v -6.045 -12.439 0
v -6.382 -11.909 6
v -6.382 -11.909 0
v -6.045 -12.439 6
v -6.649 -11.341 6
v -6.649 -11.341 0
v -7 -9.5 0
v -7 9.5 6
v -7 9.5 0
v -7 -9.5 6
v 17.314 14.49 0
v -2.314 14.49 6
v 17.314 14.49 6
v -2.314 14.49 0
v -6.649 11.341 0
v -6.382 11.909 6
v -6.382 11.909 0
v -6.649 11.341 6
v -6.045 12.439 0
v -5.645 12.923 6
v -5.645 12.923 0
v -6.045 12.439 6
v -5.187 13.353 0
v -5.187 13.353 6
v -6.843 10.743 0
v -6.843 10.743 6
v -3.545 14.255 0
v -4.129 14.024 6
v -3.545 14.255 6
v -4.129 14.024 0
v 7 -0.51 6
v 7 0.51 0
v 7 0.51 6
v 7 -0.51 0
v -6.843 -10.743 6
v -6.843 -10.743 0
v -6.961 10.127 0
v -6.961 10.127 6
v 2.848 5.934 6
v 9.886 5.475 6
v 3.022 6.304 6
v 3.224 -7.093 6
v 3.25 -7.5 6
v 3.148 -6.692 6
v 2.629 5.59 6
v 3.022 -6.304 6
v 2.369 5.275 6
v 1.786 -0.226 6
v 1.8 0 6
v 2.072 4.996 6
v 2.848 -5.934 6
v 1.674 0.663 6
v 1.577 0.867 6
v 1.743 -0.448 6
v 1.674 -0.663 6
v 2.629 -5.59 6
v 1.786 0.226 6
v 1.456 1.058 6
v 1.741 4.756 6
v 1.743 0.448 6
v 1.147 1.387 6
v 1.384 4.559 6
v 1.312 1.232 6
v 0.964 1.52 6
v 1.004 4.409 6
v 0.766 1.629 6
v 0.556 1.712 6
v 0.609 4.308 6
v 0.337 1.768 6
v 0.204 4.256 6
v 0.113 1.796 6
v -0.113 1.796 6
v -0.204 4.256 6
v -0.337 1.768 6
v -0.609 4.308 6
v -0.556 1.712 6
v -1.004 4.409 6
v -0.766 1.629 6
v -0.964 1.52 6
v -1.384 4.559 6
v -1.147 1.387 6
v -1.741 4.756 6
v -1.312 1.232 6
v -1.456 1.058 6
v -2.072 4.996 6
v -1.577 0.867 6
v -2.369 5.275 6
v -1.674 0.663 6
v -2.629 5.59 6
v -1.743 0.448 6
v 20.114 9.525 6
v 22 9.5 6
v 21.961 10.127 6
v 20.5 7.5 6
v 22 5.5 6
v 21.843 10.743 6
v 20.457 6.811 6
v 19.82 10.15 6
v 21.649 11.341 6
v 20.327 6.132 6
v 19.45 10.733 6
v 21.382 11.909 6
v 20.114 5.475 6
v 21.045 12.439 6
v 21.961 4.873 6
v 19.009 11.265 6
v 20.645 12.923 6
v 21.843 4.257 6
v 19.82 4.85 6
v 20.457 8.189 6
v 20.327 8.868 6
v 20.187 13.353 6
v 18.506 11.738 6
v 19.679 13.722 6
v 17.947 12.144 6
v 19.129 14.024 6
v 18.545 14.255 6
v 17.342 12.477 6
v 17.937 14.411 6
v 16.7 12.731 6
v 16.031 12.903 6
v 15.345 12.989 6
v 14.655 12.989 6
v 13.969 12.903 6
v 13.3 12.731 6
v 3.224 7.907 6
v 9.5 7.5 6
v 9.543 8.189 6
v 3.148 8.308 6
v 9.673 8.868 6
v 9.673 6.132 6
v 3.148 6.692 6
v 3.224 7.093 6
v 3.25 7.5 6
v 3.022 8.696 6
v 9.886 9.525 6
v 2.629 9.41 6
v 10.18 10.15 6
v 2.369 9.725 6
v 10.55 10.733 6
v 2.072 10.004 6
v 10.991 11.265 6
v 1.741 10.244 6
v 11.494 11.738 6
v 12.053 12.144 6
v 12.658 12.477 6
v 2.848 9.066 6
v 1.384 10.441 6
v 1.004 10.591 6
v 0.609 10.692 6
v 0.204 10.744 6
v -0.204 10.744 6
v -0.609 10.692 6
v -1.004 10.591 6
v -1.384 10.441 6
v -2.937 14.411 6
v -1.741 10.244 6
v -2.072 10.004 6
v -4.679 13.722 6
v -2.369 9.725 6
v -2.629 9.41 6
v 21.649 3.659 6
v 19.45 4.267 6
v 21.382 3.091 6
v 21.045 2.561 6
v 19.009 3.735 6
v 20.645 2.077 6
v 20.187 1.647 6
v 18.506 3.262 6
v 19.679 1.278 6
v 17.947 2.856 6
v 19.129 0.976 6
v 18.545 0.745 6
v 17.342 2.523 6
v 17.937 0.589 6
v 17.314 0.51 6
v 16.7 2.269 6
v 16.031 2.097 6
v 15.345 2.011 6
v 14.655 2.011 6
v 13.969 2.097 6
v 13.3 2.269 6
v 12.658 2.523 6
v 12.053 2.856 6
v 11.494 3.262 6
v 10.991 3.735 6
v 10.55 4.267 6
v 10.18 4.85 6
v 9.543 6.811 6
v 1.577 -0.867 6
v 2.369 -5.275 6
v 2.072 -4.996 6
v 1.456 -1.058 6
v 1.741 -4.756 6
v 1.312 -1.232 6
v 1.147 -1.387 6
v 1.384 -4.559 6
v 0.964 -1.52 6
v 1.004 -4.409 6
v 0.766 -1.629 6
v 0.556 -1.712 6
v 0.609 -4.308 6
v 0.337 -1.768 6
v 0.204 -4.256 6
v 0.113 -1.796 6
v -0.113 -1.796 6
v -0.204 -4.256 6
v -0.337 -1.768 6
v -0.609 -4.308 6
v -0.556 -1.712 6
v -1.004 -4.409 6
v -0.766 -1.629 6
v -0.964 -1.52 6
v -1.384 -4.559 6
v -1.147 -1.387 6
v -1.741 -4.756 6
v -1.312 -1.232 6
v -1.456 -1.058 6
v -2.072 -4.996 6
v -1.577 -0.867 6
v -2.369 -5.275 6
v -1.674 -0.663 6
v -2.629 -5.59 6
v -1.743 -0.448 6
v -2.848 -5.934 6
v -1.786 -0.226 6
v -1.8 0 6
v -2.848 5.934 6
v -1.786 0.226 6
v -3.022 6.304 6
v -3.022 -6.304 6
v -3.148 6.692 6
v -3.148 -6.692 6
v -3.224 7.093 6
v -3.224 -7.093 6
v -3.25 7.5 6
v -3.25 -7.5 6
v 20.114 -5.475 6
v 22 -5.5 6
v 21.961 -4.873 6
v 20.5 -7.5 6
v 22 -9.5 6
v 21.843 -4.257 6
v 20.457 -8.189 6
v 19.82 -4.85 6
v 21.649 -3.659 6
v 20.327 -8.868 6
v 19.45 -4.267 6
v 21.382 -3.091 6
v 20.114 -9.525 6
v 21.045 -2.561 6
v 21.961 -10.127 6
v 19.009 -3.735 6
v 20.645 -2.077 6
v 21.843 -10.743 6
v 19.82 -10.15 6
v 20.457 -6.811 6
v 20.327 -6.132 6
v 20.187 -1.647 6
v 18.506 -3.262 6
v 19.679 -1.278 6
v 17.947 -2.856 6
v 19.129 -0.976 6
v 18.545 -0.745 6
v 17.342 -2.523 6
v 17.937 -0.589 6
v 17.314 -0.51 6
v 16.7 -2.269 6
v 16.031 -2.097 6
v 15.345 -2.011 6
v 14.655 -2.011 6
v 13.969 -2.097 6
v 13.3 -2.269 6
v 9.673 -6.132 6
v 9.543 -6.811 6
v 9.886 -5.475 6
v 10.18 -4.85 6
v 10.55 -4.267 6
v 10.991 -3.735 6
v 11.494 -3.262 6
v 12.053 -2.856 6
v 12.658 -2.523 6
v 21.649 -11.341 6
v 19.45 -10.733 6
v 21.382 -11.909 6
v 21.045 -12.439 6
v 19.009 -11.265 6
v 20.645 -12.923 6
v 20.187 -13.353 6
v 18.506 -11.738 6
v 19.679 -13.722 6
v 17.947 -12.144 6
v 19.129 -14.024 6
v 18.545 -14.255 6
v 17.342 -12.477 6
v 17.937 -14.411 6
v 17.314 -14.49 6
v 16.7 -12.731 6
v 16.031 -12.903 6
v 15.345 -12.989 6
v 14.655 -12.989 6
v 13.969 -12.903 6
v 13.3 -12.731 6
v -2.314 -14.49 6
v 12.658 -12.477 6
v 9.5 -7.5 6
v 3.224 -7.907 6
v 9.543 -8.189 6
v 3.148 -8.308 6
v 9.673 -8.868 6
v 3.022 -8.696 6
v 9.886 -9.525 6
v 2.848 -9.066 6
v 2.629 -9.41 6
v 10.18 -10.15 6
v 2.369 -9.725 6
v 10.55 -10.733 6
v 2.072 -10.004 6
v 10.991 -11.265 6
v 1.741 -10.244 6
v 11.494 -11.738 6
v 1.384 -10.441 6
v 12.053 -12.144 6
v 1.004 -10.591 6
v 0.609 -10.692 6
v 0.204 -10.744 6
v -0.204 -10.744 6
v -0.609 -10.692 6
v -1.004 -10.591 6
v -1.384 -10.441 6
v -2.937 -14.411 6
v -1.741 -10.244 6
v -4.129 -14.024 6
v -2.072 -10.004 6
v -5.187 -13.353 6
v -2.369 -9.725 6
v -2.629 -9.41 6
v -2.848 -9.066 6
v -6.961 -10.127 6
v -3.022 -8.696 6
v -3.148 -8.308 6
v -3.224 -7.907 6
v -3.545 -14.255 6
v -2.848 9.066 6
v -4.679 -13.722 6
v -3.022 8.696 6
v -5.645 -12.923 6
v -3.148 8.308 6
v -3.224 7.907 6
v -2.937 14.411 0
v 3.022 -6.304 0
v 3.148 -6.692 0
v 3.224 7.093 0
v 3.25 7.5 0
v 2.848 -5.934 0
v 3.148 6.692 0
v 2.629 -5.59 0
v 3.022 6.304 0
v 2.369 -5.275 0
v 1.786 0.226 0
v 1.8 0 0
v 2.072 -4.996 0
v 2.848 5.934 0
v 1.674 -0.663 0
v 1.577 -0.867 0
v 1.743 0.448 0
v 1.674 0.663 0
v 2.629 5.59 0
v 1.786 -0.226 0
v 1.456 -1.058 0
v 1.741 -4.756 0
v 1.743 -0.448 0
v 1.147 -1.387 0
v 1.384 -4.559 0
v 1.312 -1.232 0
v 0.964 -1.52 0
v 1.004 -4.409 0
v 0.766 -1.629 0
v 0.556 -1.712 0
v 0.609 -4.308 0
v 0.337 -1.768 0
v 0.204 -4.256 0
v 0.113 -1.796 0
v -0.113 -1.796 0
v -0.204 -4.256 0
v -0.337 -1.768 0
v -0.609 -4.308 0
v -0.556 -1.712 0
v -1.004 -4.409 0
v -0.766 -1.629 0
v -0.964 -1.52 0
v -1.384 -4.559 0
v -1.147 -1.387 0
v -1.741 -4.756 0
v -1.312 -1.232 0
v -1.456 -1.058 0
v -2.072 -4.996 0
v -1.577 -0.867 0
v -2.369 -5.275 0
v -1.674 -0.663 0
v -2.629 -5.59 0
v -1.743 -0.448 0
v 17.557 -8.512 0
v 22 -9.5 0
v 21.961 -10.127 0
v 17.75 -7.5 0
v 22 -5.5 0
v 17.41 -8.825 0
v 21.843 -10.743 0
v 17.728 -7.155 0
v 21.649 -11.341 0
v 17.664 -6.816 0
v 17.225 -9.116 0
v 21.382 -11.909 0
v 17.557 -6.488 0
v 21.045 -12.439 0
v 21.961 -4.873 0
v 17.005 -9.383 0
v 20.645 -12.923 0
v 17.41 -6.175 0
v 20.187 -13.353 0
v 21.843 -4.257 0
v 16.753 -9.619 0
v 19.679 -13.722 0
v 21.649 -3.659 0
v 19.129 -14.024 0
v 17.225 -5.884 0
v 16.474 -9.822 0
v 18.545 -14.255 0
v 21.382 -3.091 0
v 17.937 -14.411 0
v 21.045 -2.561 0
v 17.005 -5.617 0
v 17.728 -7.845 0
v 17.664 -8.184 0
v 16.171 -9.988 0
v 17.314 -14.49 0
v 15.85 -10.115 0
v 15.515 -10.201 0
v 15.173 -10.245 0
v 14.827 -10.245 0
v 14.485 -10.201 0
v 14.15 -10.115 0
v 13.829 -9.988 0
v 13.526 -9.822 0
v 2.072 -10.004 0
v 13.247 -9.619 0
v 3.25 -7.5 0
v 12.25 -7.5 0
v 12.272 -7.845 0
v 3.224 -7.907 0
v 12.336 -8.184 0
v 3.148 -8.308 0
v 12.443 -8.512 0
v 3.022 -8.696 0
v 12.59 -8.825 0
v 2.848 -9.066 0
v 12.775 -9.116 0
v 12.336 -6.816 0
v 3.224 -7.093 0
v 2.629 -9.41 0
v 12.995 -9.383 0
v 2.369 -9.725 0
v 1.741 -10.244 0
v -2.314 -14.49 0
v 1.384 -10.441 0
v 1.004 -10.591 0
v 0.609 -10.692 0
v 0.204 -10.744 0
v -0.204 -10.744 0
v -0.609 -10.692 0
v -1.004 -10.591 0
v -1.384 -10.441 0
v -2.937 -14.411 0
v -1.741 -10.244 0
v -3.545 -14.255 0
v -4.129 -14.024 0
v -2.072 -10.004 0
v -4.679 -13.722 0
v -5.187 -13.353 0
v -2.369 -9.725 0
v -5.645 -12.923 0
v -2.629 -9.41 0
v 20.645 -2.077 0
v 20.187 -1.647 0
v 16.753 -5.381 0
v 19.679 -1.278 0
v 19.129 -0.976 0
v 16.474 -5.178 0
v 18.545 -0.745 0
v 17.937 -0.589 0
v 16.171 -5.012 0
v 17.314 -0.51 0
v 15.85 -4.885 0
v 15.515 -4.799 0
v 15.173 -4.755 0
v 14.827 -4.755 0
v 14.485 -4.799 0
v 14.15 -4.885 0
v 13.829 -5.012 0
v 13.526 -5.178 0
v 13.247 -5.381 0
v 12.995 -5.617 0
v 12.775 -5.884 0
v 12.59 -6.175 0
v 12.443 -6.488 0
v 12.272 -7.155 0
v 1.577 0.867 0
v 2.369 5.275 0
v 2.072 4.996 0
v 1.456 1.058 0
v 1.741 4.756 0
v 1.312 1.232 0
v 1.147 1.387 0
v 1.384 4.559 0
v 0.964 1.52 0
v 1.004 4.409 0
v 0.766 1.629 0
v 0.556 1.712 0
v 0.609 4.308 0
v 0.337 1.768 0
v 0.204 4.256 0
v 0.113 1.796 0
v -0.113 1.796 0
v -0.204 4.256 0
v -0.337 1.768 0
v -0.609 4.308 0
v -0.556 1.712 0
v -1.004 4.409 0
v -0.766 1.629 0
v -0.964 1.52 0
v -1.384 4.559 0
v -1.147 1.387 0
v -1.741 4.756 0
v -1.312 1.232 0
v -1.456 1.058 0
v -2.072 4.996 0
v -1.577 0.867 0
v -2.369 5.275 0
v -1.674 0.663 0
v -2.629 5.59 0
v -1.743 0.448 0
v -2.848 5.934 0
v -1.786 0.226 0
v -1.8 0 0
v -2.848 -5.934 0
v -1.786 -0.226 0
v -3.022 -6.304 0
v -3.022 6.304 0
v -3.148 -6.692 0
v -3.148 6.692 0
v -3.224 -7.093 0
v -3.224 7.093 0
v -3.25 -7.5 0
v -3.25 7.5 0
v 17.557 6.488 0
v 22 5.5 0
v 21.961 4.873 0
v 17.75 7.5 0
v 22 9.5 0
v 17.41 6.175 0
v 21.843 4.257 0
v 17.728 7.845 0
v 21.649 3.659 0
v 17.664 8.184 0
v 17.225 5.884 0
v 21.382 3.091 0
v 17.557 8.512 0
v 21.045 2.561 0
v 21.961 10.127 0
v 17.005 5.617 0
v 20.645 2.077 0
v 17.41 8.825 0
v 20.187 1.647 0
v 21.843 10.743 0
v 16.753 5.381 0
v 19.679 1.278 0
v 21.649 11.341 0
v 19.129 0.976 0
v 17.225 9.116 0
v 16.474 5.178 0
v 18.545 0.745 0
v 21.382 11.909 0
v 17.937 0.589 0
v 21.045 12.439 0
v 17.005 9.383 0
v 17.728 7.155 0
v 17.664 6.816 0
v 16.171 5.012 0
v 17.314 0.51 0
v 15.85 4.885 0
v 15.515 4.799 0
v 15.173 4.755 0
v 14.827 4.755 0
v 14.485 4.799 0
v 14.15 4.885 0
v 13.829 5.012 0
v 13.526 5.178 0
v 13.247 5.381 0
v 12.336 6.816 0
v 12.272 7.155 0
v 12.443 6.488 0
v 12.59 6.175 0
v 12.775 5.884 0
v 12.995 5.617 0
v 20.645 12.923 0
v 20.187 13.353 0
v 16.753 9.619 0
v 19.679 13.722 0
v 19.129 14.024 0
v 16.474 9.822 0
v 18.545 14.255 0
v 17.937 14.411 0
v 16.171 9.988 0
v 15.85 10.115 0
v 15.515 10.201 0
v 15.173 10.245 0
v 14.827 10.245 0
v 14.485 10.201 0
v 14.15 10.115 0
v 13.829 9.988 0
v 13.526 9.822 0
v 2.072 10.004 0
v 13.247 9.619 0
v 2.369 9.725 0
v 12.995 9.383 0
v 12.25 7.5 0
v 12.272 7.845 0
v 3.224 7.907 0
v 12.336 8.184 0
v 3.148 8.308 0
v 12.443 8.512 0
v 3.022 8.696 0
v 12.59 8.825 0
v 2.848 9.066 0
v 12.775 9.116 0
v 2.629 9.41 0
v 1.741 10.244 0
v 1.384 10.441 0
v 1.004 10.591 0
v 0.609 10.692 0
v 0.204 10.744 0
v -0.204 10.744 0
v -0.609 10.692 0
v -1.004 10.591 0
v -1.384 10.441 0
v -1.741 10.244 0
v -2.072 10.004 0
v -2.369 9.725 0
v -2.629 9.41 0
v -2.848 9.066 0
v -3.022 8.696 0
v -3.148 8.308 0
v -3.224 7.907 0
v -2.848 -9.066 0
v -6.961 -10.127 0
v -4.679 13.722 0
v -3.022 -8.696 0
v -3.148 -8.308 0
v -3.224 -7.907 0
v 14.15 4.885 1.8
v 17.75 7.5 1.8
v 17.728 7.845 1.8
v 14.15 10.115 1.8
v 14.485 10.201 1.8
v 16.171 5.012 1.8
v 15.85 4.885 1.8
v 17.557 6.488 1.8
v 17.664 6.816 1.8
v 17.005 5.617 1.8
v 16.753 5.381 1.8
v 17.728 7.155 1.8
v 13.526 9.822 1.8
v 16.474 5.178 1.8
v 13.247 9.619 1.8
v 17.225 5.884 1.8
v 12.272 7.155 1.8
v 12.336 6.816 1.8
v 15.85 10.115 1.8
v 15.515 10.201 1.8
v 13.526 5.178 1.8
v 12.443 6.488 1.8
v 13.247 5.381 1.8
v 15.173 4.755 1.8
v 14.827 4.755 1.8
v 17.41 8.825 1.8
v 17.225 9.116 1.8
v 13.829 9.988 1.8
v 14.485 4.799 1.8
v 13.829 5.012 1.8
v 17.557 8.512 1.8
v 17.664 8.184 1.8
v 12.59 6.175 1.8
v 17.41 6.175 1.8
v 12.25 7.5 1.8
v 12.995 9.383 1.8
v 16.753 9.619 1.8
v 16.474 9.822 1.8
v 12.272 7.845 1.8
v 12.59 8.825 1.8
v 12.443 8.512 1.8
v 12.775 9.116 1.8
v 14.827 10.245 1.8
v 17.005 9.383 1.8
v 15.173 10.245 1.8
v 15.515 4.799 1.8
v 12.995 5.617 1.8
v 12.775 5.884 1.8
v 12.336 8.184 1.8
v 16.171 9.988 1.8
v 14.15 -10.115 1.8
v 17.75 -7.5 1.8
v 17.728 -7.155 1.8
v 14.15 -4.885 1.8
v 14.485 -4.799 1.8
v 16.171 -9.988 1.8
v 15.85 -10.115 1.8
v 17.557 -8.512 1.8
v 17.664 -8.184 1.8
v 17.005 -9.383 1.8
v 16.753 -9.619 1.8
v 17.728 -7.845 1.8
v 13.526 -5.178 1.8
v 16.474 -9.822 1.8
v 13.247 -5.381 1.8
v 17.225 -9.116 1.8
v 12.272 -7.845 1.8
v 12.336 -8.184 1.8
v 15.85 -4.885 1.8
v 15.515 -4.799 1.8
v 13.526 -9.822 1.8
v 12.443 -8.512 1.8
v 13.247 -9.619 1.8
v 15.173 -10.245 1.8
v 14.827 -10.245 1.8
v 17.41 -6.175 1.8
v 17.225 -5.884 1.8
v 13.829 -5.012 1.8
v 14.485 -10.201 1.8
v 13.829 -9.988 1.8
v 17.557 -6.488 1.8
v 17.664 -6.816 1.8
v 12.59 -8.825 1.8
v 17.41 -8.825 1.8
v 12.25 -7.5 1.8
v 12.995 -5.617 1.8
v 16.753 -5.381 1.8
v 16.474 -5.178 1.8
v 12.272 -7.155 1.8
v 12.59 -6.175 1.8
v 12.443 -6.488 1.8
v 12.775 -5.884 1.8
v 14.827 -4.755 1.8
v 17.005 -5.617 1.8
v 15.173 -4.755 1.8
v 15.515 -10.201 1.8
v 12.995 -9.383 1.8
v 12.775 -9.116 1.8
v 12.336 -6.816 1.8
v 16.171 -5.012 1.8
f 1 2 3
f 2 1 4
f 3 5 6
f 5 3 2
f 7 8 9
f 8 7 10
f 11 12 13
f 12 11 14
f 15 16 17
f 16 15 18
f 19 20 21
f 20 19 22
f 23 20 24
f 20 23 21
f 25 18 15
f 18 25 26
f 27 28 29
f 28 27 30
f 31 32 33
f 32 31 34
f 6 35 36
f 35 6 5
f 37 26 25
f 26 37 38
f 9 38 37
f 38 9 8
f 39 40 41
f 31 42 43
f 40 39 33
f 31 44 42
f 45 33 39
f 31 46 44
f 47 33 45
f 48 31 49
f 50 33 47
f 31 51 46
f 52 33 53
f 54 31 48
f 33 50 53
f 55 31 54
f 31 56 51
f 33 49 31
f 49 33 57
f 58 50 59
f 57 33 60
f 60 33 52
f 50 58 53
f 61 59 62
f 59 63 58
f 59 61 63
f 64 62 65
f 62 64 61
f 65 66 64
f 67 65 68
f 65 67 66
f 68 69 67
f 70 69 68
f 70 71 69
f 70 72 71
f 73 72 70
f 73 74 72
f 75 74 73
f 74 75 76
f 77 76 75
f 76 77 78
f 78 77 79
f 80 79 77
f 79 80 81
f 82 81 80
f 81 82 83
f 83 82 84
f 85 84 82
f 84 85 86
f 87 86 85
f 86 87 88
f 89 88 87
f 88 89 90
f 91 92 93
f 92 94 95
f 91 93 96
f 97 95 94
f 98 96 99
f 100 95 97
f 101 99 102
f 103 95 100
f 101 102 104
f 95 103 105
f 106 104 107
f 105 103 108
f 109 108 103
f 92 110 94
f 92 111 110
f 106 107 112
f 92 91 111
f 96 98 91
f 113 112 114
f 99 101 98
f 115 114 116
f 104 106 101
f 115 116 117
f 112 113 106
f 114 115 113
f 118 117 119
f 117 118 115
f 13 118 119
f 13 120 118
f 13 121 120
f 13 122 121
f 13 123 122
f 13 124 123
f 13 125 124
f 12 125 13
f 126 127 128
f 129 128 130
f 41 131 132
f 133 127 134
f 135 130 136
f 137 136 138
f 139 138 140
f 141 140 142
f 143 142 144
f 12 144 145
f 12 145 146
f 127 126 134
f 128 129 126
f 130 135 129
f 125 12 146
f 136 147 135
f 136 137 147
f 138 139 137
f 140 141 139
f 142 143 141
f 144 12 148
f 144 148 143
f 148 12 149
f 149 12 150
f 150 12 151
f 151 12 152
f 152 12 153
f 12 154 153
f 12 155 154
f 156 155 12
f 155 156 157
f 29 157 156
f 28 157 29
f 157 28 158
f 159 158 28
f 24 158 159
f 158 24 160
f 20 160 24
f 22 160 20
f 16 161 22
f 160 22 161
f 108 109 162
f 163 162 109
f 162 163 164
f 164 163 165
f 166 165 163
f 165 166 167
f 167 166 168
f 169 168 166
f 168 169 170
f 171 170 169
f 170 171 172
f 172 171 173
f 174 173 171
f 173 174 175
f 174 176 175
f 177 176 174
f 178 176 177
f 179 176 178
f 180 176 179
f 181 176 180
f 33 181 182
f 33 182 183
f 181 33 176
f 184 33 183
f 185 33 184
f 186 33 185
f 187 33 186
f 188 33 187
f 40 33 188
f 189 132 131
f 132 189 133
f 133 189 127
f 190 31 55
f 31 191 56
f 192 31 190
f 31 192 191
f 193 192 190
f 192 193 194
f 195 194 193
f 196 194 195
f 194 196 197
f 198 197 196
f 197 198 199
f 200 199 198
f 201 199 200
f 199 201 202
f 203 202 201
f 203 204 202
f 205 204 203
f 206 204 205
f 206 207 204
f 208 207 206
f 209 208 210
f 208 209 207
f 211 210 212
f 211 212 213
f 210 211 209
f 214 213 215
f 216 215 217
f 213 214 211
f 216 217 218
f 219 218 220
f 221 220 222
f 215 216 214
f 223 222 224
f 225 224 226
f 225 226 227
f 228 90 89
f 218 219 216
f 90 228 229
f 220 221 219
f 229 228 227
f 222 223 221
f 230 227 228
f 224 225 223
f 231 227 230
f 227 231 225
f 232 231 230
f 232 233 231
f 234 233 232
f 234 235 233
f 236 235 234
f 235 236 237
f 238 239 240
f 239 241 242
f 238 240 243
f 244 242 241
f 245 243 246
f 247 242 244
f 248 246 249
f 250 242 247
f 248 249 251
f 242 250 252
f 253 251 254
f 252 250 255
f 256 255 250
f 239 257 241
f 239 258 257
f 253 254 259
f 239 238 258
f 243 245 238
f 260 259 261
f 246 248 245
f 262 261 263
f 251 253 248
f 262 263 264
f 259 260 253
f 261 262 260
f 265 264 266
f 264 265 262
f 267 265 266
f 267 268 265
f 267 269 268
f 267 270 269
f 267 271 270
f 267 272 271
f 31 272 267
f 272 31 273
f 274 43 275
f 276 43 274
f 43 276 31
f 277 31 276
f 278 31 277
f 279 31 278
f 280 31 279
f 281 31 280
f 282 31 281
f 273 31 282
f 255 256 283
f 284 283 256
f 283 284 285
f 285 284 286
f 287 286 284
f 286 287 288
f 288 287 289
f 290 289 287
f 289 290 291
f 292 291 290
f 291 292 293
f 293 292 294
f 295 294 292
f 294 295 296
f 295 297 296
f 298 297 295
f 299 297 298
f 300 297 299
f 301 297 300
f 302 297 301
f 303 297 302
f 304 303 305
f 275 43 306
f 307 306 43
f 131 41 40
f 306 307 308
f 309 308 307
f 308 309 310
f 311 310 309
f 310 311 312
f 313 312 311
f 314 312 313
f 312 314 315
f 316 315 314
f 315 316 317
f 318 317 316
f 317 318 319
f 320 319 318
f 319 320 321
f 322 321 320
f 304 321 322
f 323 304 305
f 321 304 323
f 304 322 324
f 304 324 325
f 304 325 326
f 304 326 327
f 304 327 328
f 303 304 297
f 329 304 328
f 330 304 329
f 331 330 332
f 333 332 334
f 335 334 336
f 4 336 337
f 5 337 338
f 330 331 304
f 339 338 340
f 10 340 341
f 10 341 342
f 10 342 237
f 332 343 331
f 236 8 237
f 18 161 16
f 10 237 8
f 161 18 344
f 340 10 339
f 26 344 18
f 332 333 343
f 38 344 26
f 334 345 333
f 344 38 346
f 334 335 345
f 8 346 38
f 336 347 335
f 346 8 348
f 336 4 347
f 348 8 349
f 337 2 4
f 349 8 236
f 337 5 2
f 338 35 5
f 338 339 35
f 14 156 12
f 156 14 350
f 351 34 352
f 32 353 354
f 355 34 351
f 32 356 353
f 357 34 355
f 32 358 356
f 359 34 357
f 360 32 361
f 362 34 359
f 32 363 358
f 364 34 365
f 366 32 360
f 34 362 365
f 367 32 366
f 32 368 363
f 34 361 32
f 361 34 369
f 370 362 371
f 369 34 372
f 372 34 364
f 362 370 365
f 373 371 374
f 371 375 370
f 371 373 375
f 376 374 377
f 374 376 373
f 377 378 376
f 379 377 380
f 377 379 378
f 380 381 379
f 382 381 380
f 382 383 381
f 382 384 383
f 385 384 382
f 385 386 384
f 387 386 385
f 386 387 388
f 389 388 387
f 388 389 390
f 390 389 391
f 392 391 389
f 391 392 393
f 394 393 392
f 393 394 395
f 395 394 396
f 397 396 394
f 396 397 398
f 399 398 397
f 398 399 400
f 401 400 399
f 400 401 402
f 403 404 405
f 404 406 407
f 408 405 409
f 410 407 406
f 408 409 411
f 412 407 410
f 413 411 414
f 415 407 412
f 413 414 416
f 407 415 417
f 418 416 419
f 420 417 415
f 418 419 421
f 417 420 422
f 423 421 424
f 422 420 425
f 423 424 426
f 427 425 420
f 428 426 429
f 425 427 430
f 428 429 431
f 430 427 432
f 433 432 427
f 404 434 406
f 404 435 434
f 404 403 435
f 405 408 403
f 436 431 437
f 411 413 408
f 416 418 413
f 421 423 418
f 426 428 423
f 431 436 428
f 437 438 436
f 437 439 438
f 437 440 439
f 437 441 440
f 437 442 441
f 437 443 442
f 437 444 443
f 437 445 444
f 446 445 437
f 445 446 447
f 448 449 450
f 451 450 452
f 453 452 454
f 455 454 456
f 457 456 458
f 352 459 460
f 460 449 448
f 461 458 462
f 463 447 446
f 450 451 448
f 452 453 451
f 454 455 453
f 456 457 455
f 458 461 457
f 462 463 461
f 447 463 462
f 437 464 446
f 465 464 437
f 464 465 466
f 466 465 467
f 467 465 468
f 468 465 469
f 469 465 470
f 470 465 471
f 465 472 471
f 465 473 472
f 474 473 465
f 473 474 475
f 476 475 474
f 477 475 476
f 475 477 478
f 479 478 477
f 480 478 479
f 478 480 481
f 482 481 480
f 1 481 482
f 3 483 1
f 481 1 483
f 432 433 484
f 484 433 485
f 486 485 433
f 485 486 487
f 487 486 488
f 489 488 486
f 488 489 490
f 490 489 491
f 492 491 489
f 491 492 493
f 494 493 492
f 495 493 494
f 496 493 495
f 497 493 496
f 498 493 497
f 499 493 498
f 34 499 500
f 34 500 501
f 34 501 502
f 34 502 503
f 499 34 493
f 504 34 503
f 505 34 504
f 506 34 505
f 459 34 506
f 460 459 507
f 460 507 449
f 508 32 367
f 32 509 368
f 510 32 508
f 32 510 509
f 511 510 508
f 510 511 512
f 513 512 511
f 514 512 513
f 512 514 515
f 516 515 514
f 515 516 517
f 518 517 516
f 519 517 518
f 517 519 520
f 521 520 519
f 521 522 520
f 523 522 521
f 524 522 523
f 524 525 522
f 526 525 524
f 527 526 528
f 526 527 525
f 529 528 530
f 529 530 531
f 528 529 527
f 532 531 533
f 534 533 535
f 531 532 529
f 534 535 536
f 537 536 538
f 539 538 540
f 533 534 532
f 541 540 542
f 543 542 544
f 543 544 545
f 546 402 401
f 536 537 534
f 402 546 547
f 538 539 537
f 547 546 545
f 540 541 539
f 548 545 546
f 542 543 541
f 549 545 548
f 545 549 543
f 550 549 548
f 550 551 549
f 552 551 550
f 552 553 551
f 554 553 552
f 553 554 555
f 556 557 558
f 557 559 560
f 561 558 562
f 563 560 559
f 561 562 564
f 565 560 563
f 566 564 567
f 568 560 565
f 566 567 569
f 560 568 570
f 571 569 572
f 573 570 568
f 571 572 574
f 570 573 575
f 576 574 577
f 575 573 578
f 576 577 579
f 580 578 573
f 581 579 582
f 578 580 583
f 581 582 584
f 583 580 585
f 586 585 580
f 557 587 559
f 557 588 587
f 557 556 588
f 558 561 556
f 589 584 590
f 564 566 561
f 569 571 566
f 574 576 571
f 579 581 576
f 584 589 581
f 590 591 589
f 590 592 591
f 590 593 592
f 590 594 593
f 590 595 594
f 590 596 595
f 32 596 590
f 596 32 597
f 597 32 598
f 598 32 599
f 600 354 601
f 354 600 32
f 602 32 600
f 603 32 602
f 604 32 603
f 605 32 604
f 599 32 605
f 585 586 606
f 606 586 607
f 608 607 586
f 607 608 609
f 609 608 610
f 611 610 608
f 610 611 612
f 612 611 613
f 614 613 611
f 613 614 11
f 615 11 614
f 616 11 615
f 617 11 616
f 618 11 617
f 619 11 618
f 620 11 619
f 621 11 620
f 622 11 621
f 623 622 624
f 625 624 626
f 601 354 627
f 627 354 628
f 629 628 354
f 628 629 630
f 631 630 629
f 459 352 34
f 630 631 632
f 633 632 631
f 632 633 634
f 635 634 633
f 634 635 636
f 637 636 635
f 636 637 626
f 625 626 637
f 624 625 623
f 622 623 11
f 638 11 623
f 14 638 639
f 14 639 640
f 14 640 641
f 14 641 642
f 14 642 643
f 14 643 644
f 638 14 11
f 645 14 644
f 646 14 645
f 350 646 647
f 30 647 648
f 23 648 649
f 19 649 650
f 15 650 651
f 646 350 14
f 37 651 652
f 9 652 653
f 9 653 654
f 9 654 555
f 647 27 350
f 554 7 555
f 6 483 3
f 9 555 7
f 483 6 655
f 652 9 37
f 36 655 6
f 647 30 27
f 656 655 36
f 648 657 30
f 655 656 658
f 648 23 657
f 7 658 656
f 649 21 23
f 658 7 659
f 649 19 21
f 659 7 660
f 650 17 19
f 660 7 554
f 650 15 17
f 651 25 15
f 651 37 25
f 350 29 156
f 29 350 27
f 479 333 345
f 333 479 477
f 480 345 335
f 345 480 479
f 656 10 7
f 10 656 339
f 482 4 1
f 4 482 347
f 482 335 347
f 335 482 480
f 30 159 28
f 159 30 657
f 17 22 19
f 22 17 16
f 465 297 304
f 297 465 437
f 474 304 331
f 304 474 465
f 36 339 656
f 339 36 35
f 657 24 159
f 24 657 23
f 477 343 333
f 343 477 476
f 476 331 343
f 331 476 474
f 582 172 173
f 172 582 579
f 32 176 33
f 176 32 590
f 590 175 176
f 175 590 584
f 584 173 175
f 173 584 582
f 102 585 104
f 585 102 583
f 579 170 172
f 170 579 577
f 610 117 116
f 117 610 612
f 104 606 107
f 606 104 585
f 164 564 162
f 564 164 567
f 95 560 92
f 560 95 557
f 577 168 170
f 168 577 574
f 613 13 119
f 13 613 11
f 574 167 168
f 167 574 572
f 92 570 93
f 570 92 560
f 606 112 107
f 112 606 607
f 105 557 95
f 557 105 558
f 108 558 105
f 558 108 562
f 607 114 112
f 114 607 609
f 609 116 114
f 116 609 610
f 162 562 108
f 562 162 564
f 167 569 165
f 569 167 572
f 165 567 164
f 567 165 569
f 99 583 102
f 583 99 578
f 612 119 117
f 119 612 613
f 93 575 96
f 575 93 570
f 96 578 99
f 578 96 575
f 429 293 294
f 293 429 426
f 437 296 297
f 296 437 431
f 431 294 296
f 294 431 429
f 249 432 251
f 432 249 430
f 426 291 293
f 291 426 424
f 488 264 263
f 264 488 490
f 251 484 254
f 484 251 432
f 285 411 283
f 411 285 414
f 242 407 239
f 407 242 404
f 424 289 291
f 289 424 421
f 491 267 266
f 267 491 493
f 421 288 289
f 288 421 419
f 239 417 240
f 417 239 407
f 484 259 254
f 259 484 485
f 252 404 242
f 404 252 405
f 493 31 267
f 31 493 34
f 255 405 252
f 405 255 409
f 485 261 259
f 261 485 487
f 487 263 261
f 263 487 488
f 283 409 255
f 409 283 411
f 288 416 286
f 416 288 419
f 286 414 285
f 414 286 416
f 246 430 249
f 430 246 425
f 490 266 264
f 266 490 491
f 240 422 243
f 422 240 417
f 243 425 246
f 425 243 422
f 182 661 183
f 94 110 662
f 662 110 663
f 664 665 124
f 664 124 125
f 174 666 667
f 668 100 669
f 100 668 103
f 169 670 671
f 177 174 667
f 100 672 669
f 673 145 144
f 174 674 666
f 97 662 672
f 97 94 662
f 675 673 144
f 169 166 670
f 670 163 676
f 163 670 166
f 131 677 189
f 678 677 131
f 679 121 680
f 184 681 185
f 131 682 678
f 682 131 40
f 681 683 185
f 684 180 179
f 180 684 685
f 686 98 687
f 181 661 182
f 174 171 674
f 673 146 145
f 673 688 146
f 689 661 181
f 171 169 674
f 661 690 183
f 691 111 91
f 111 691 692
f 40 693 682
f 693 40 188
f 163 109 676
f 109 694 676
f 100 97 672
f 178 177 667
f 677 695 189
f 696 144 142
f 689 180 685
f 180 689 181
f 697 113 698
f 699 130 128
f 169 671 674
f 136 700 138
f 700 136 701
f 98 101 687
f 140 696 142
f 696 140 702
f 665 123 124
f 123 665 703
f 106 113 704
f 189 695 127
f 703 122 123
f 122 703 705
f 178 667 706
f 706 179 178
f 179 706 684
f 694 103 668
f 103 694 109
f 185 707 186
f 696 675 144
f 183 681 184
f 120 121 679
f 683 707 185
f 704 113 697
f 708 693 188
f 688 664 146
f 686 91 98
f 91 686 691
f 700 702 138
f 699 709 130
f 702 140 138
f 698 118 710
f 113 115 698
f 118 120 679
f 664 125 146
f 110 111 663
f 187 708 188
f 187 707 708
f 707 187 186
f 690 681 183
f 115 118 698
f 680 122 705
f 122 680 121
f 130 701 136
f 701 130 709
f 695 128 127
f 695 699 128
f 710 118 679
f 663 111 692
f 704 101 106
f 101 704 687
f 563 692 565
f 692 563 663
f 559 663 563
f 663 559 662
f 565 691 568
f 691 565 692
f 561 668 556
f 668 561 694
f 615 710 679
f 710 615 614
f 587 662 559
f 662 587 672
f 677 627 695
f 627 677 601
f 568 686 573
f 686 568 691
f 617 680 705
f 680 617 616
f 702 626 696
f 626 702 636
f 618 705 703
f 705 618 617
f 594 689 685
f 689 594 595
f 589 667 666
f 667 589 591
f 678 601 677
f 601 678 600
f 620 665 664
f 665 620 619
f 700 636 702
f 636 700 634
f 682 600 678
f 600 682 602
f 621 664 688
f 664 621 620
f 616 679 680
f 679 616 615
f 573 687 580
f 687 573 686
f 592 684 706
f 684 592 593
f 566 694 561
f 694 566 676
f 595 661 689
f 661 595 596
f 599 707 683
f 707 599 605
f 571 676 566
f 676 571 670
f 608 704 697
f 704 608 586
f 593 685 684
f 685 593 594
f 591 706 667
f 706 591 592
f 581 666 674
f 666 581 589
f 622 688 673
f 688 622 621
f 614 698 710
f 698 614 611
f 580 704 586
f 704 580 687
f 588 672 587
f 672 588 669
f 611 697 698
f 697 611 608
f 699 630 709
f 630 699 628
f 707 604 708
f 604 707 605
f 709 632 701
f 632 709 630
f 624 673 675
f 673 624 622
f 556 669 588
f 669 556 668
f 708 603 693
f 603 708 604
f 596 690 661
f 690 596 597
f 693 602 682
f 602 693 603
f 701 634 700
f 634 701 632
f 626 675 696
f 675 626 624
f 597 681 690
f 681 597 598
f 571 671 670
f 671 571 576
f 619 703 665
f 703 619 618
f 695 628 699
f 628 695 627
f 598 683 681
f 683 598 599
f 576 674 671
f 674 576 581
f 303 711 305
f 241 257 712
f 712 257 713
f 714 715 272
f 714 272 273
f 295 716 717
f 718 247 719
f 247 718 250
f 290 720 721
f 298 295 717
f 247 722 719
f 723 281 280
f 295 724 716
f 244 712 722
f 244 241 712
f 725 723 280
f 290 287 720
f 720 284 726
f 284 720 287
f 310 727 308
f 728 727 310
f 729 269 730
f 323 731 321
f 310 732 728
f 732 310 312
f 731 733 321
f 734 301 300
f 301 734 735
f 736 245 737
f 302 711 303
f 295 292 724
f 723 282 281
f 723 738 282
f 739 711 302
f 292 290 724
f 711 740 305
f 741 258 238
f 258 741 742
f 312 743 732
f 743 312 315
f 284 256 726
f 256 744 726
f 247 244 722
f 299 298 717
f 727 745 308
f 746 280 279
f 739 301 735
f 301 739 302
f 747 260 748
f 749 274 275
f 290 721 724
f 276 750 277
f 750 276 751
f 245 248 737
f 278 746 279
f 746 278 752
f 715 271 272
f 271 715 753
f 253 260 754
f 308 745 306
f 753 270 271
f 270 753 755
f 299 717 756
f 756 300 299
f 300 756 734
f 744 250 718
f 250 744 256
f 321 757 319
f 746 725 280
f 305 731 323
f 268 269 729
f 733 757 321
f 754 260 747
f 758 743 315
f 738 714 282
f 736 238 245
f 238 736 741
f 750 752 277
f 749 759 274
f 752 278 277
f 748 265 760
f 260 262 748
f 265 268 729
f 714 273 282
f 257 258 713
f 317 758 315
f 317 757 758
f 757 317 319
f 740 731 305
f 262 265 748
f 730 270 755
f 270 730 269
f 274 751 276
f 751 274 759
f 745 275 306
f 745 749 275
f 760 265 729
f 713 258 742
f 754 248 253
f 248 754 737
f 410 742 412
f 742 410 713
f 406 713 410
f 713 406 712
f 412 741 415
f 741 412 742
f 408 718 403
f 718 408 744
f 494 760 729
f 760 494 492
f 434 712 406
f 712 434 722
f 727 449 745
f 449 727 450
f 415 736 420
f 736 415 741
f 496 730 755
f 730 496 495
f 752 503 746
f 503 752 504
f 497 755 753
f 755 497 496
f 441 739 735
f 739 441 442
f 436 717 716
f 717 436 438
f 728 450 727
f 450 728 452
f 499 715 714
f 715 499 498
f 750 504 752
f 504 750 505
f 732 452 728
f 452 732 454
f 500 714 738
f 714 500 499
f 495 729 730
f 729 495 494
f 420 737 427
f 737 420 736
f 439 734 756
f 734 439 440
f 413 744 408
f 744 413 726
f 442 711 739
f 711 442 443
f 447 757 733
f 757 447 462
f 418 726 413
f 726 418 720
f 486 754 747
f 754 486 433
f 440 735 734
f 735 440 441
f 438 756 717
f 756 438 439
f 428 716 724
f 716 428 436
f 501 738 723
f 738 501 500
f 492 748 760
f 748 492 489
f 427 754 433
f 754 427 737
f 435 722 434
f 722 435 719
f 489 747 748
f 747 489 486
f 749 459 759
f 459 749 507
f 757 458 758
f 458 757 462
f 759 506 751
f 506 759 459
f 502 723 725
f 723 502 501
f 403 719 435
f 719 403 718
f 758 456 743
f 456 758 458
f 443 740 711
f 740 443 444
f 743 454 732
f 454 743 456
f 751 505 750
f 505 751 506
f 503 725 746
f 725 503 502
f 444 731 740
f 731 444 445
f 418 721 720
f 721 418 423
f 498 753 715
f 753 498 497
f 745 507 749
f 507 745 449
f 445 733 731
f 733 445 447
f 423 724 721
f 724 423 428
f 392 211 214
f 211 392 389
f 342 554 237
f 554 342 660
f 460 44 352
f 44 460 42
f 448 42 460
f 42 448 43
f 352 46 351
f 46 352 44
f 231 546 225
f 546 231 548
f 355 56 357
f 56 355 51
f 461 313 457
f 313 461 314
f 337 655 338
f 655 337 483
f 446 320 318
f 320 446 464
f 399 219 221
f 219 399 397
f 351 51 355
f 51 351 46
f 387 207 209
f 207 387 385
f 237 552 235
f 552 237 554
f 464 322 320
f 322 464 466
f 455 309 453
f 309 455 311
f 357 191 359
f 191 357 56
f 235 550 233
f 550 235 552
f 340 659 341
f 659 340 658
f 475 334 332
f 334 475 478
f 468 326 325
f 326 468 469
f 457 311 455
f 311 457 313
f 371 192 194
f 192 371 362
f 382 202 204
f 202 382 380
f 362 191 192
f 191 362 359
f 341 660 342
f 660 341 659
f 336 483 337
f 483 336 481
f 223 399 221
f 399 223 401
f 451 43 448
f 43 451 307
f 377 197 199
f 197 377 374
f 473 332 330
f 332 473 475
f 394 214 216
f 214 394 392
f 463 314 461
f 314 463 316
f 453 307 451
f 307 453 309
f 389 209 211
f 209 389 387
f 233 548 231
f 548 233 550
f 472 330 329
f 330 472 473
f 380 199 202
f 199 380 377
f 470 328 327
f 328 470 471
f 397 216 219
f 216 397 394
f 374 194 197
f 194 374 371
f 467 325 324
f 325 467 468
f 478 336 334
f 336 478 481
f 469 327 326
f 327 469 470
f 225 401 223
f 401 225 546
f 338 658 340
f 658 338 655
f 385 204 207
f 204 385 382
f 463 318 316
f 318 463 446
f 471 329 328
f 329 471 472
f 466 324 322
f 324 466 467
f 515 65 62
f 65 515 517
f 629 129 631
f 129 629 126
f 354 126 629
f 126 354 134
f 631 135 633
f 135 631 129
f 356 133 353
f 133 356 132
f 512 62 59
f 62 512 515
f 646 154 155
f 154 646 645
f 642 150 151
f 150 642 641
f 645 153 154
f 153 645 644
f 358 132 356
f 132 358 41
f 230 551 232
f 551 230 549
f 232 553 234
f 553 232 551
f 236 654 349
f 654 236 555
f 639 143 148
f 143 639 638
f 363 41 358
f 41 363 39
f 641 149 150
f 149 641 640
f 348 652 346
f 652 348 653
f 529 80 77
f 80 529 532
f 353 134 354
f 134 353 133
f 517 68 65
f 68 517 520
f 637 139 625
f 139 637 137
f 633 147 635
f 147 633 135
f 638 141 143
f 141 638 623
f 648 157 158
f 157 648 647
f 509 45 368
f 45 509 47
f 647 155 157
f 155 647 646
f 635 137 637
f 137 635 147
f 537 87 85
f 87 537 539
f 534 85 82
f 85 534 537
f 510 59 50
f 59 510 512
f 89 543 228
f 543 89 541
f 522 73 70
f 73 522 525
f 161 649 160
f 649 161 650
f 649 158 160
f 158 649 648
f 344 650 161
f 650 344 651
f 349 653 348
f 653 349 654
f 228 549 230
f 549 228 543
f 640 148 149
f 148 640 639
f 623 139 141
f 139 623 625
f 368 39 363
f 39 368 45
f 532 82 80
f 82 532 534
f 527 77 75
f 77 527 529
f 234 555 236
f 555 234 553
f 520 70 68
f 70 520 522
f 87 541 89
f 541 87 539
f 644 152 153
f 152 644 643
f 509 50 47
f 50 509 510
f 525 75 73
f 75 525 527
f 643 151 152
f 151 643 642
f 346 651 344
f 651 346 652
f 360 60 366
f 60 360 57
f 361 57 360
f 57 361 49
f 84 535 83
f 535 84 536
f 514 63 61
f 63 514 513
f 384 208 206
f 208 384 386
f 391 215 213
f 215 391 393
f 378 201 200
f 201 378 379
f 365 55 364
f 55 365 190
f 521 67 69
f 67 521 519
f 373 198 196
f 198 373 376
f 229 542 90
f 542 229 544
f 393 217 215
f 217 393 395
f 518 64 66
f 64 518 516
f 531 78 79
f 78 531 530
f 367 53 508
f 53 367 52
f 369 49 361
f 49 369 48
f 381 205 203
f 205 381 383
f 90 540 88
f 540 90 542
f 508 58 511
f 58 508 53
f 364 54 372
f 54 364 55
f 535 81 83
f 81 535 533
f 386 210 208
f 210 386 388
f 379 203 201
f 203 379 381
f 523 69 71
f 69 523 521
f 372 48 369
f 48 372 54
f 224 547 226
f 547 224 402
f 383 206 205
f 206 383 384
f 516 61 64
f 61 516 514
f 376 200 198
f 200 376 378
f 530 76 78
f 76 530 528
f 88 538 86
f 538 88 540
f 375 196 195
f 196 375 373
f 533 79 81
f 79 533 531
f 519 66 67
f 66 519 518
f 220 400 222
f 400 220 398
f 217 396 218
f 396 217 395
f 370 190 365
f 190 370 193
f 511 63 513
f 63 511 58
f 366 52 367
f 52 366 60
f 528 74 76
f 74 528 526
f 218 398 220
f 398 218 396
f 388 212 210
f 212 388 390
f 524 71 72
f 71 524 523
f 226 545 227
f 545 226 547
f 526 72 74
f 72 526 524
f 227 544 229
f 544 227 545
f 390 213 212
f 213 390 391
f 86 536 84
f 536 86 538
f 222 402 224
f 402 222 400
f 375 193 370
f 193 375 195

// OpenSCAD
$fn = 50;


difference() {
	union() {
		hull() {
			translate(v = [-2.0000000000, 9.5000000000, 0]) {
				cylinder(h = 6, r = 5);
			}
			translate(v = [2.0000000000, 9.5000000000, 0]) {
				cylinder(h = 6, r = 5);
			}
			translate(v = [-2.0000000000, -9.5000000000, 0]) {
				cylinder(h = 6, r = 5);
			}
			translate(v = [2.0000000000, -9.5000000000, 0]) {
				cylinder(h = 6, r = 5);
			}
		}
		translate(v = [7.5000000000, 7.5000000000, 0]) {
			hull() {
				translate(v = [-9.5000000000, 2.0000000000, 0]) {
					cylinder(h = 6, r = 5);
				}
				translate(v = [9.5000000000, 2.0000000000, 0]) {
					cylinder(h = 6, r = 5);
				}
				translate(v = [-9.5000000000, -2.0000000000, 0]) {
					cylinder(h = 6, r = 5);
				}
				translate(v = [9.5000000000, -2.0000000000, 0]) {
					cylinder(h = 6, r = 5);
				}
			}
		}
		translate(v = [7.5000000000, -7.5000000000, 0]) {
			hull() {
				translate(v = [-9.5000000000, 2.0000000000, 0]) {
					cylinder(h = 6, r = 5);
				}
				translate(v = [9.5000000000, 2.0000000000, 0]) {
					cylinder(h = 6, r = 5);
				}
				translate(v = [-9.5000000000, -2.0000000000, 0]) {
					cylinder(h = 6, r = 5);
				}
				translate(v = [9.5000000000, -2.0000000000, 0]) {
					cylinder(h = 6, r = 5);
				}
			}
		}
	}
	union() {
		translate(v = [15.0000000000, 7.5000000000, 6]) {
			rotate(a = [0, 0, 0]) {
				difference() {
					union() {
						#translate(v = [0, 0, -6.0000000000]) {
							cylinder(h = 6, r = 2.2500000000);
						}
						#translate(v = [0, 0, -4.2000000000]) {
							cylinder(h = 4.2000000000, r1 = 2.7500000000, r2 = 5.5000000000);
						}
						#translate(v = [0, 0, -6.0000000000]) {
							cylinder(h = 6, r = 2.7500000000);
						}
						#translate(v = [0, 0, -6.0000000000]) {
							cylinder(h = 6, r = 2.2500000000);
						}
					}
					union();
				}
			}
		}
		translate(v = [15.0000000000, -7.5000000000, 6]) {
			rotate(a = [0, 0, 0]) {
				difference() {
					union() {
						#translate(v = [0, 0, -6.0000000000]) {
							cylinder(h = 6, r = 2.2500000000);
						}
						#translate(v = [0, 0, -4.2000000000]) {
							cylinder(h = 4.2000000000, r1 = 2.7500000000, r2 = 5.5000000000);
						}
						#translate(v = [0, 0, -6.0000000000]) {
							cylinder(h = 6, r = 2.7500000000);
						}
						#translate(v = [0, 0, -6.0000000000]) {
							cylinder(h = 6, r = 2.2500000000);
						}
					}
					union();
				}
			}
		}
		translate(v = [0.0000000000, -7.5000000000, 0]) {
			translate(v = [0, 0, -100]) {
				cylinder(h = 200, r = 3.2500000000);
			}
		}
		translate(v = [0.0000000000, 7.5000000000, 0]) {
			translate(v = [0, 0, -100]) {
				cylinder(h = 200, r = 3.2500000000);
			}
		}
		translate(v = [0.0000000000, -7.5000000000, 0]) {
			translate(v = [0, 0, -100]) {
				cylinder(h = 200, r = 1.8000000000);
			}
		}
		translate(v = [0, 0, -100]) {
			cylinder(h = 200, r = 1.8000000000);
		}
		translate(v = [0.0000000000, 7.5000000000, 0]) {
			translate(v = [0, 0, -100]) {
				cylinder(h = 200, r = 1.8000000000);
			}
		}
	}
}
